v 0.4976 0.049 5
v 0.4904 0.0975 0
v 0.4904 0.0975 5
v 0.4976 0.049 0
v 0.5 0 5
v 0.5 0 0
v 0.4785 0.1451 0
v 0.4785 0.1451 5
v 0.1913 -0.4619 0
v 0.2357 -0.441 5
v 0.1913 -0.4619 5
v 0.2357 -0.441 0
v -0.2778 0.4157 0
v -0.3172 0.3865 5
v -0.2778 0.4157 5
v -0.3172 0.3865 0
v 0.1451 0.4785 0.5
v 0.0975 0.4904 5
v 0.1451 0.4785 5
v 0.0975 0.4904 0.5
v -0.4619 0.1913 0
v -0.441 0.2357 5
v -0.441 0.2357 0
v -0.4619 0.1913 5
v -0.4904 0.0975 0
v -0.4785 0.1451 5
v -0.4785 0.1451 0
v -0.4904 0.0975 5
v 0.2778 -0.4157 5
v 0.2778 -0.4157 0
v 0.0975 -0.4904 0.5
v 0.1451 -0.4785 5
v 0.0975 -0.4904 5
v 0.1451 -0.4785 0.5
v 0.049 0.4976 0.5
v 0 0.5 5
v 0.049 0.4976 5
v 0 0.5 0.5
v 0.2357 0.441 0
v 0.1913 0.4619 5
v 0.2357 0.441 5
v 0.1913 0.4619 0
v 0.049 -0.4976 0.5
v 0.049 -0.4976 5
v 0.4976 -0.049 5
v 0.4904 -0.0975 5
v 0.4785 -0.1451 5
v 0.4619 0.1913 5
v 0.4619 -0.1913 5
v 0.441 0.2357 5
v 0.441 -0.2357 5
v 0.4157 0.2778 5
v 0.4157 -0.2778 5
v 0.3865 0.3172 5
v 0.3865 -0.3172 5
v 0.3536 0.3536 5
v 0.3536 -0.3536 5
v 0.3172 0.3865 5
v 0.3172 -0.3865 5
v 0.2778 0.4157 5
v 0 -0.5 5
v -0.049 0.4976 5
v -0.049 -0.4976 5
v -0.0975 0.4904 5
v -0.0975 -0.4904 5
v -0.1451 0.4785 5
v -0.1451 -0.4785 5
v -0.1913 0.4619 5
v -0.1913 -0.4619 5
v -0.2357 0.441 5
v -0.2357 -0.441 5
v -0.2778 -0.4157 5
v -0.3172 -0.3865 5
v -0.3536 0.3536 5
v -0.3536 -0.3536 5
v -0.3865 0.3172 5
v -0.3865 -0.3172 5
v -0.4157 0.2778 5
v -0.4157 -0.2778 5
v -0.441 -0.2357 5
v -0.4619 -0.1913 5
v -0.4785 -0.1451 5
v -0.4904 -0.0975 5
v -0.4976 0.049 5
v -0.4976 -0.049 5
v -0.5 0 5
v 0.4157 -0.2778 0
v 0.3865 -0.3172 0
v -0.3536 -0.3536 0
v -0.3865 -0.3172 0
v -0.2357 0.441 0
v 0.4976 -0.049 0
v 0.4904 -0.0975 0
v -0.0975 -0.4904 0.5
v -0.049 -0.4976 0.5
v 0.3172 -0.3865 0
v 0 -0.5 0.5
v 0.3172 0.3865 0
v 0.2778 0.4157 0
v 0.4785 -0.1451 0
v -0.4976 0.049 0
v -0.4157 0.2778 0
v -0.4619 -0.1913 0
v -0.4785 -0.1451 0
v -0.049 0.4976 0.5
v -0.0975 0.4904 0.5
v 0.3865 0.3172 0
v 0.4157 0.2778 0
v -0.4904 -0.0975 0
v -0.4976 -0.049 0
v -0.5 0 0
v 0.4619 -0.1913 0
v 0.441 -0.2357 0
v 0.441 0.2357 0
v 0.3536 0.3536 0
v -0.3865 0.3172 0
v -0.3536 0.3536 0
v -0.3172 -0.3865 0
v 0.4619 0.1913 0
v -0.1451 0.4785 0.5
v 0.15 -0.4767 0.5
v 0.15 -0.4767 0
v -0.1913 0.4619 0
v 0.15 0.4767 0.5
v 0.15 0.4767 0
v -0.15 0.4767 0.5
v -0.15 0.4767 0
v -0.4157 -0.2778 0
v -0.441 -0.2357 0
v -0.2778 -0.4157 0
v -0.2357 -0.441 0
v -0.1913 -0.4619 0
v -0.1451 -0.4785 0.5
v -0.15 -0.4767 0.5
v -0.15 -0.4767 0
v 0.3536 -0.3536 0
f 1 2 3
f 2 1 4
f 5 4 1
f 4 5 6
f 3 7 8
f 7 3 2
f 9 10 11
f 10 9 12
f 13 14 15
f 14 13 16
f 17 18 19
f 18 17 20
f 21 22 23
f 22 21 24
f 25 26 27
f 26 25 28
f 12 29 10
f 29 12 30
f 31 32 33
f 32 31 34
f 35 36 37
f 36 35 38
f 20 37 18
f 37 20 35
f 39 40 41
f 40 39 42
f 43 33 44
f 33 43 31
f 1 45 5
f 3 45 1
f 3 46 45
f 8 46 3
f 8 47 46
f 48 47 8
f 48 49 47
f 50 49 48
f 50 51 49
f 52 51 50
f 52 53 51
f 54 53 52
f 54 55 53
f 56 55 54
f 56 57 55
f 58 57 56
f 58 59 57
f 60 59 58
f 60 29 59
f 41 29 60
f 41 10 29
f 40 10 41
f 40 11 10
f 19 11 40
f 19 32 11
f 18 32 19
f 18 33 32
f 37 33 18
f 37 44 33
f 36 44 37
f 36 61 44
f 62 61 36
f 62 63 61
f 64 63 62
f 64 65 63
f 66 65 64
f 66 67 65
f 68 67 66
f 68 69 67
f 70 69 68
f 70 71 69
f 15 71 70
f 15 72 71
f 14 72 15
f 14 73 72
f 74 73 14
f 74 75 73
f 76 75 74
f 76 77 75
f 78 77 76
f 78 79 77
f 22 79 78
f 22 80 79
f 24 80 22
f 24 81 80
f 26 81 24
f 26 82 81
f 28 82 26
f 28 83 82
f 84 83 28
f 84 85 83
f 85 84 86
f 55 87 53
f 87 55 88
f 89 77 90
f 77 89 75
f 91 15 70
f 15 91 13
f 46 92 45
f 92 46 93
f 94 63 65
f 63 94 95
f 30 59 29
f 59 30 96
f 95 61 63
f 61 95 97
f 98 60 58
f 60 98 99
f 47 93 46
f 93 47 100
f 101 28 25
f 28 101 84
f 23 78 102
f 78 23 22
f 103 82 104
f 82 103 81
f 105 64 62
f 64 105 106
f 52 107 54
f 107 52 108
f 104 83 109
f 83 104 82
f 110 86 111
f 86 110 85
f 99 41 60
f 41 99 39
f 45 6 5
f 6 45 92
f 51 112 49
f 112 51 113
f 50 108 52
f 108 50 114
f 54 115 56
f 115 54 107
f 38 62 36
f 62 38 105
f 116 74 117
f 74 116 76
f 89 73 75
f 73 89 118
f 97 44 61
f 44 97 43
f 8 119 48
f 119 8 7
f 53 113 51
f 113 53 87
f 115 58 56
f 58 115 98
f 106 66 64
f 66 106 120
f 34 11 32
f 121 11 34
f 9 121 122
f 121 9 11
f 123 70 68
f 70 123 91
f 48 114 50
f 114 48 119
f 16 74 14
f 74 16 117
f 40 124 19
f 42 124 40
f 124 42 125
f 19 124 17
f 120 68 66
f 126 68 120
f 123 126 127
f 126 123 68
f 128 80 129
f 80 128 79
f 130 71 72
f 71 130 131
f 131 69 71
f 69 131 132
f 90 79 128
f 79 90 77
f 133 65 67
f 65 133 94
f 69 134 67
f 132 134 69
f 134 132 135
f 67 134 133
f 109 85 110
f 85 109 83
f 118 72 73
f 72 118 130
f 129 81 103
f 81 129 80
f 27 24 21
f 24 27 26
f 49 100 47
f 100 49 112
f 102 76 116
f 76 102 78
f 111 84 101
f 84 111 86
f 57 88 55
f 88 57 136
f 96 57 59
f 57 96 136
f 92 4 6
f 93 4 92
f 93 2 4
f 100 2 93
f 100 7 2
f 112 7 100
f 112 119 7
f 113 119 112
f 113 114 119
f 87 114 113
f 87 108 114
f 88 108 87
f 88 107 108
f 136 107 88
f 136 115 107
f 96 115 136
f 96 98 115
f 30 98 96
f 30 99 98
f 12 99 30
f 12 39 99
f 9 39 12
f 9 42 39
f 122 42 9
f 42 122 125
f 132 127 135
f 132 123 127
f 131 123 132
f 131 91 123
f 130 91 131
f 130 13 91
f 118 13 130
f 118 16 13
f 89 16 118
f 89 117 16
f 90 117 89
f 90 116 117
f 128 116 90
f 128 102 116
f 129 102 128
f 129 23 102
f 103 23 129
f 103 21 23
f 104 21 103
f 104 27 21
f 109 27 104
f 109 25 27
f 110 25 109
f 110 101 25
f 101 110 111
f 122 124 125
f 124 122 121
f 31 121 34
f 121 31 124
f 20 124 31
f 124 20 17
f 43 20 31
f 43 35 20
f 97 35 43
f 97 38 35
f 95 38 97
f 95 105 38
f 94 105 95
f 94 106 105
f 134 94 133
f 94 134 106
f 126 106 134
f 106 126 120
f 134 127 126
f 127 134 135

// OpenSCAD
$fn = 64;
diameter = 1;
length = 5;
width = 0.3;
height = 0.5;


module baseplug(){
    cylinder( length, diameter/2, diameter/2);
}

module gap(){
    translate([ -width/2, -1.5*diameter, -height]){
        cube([ width, 3*diameter, 2*height]);
    }
}

difference(){
    baseplug();
    gap();
}
